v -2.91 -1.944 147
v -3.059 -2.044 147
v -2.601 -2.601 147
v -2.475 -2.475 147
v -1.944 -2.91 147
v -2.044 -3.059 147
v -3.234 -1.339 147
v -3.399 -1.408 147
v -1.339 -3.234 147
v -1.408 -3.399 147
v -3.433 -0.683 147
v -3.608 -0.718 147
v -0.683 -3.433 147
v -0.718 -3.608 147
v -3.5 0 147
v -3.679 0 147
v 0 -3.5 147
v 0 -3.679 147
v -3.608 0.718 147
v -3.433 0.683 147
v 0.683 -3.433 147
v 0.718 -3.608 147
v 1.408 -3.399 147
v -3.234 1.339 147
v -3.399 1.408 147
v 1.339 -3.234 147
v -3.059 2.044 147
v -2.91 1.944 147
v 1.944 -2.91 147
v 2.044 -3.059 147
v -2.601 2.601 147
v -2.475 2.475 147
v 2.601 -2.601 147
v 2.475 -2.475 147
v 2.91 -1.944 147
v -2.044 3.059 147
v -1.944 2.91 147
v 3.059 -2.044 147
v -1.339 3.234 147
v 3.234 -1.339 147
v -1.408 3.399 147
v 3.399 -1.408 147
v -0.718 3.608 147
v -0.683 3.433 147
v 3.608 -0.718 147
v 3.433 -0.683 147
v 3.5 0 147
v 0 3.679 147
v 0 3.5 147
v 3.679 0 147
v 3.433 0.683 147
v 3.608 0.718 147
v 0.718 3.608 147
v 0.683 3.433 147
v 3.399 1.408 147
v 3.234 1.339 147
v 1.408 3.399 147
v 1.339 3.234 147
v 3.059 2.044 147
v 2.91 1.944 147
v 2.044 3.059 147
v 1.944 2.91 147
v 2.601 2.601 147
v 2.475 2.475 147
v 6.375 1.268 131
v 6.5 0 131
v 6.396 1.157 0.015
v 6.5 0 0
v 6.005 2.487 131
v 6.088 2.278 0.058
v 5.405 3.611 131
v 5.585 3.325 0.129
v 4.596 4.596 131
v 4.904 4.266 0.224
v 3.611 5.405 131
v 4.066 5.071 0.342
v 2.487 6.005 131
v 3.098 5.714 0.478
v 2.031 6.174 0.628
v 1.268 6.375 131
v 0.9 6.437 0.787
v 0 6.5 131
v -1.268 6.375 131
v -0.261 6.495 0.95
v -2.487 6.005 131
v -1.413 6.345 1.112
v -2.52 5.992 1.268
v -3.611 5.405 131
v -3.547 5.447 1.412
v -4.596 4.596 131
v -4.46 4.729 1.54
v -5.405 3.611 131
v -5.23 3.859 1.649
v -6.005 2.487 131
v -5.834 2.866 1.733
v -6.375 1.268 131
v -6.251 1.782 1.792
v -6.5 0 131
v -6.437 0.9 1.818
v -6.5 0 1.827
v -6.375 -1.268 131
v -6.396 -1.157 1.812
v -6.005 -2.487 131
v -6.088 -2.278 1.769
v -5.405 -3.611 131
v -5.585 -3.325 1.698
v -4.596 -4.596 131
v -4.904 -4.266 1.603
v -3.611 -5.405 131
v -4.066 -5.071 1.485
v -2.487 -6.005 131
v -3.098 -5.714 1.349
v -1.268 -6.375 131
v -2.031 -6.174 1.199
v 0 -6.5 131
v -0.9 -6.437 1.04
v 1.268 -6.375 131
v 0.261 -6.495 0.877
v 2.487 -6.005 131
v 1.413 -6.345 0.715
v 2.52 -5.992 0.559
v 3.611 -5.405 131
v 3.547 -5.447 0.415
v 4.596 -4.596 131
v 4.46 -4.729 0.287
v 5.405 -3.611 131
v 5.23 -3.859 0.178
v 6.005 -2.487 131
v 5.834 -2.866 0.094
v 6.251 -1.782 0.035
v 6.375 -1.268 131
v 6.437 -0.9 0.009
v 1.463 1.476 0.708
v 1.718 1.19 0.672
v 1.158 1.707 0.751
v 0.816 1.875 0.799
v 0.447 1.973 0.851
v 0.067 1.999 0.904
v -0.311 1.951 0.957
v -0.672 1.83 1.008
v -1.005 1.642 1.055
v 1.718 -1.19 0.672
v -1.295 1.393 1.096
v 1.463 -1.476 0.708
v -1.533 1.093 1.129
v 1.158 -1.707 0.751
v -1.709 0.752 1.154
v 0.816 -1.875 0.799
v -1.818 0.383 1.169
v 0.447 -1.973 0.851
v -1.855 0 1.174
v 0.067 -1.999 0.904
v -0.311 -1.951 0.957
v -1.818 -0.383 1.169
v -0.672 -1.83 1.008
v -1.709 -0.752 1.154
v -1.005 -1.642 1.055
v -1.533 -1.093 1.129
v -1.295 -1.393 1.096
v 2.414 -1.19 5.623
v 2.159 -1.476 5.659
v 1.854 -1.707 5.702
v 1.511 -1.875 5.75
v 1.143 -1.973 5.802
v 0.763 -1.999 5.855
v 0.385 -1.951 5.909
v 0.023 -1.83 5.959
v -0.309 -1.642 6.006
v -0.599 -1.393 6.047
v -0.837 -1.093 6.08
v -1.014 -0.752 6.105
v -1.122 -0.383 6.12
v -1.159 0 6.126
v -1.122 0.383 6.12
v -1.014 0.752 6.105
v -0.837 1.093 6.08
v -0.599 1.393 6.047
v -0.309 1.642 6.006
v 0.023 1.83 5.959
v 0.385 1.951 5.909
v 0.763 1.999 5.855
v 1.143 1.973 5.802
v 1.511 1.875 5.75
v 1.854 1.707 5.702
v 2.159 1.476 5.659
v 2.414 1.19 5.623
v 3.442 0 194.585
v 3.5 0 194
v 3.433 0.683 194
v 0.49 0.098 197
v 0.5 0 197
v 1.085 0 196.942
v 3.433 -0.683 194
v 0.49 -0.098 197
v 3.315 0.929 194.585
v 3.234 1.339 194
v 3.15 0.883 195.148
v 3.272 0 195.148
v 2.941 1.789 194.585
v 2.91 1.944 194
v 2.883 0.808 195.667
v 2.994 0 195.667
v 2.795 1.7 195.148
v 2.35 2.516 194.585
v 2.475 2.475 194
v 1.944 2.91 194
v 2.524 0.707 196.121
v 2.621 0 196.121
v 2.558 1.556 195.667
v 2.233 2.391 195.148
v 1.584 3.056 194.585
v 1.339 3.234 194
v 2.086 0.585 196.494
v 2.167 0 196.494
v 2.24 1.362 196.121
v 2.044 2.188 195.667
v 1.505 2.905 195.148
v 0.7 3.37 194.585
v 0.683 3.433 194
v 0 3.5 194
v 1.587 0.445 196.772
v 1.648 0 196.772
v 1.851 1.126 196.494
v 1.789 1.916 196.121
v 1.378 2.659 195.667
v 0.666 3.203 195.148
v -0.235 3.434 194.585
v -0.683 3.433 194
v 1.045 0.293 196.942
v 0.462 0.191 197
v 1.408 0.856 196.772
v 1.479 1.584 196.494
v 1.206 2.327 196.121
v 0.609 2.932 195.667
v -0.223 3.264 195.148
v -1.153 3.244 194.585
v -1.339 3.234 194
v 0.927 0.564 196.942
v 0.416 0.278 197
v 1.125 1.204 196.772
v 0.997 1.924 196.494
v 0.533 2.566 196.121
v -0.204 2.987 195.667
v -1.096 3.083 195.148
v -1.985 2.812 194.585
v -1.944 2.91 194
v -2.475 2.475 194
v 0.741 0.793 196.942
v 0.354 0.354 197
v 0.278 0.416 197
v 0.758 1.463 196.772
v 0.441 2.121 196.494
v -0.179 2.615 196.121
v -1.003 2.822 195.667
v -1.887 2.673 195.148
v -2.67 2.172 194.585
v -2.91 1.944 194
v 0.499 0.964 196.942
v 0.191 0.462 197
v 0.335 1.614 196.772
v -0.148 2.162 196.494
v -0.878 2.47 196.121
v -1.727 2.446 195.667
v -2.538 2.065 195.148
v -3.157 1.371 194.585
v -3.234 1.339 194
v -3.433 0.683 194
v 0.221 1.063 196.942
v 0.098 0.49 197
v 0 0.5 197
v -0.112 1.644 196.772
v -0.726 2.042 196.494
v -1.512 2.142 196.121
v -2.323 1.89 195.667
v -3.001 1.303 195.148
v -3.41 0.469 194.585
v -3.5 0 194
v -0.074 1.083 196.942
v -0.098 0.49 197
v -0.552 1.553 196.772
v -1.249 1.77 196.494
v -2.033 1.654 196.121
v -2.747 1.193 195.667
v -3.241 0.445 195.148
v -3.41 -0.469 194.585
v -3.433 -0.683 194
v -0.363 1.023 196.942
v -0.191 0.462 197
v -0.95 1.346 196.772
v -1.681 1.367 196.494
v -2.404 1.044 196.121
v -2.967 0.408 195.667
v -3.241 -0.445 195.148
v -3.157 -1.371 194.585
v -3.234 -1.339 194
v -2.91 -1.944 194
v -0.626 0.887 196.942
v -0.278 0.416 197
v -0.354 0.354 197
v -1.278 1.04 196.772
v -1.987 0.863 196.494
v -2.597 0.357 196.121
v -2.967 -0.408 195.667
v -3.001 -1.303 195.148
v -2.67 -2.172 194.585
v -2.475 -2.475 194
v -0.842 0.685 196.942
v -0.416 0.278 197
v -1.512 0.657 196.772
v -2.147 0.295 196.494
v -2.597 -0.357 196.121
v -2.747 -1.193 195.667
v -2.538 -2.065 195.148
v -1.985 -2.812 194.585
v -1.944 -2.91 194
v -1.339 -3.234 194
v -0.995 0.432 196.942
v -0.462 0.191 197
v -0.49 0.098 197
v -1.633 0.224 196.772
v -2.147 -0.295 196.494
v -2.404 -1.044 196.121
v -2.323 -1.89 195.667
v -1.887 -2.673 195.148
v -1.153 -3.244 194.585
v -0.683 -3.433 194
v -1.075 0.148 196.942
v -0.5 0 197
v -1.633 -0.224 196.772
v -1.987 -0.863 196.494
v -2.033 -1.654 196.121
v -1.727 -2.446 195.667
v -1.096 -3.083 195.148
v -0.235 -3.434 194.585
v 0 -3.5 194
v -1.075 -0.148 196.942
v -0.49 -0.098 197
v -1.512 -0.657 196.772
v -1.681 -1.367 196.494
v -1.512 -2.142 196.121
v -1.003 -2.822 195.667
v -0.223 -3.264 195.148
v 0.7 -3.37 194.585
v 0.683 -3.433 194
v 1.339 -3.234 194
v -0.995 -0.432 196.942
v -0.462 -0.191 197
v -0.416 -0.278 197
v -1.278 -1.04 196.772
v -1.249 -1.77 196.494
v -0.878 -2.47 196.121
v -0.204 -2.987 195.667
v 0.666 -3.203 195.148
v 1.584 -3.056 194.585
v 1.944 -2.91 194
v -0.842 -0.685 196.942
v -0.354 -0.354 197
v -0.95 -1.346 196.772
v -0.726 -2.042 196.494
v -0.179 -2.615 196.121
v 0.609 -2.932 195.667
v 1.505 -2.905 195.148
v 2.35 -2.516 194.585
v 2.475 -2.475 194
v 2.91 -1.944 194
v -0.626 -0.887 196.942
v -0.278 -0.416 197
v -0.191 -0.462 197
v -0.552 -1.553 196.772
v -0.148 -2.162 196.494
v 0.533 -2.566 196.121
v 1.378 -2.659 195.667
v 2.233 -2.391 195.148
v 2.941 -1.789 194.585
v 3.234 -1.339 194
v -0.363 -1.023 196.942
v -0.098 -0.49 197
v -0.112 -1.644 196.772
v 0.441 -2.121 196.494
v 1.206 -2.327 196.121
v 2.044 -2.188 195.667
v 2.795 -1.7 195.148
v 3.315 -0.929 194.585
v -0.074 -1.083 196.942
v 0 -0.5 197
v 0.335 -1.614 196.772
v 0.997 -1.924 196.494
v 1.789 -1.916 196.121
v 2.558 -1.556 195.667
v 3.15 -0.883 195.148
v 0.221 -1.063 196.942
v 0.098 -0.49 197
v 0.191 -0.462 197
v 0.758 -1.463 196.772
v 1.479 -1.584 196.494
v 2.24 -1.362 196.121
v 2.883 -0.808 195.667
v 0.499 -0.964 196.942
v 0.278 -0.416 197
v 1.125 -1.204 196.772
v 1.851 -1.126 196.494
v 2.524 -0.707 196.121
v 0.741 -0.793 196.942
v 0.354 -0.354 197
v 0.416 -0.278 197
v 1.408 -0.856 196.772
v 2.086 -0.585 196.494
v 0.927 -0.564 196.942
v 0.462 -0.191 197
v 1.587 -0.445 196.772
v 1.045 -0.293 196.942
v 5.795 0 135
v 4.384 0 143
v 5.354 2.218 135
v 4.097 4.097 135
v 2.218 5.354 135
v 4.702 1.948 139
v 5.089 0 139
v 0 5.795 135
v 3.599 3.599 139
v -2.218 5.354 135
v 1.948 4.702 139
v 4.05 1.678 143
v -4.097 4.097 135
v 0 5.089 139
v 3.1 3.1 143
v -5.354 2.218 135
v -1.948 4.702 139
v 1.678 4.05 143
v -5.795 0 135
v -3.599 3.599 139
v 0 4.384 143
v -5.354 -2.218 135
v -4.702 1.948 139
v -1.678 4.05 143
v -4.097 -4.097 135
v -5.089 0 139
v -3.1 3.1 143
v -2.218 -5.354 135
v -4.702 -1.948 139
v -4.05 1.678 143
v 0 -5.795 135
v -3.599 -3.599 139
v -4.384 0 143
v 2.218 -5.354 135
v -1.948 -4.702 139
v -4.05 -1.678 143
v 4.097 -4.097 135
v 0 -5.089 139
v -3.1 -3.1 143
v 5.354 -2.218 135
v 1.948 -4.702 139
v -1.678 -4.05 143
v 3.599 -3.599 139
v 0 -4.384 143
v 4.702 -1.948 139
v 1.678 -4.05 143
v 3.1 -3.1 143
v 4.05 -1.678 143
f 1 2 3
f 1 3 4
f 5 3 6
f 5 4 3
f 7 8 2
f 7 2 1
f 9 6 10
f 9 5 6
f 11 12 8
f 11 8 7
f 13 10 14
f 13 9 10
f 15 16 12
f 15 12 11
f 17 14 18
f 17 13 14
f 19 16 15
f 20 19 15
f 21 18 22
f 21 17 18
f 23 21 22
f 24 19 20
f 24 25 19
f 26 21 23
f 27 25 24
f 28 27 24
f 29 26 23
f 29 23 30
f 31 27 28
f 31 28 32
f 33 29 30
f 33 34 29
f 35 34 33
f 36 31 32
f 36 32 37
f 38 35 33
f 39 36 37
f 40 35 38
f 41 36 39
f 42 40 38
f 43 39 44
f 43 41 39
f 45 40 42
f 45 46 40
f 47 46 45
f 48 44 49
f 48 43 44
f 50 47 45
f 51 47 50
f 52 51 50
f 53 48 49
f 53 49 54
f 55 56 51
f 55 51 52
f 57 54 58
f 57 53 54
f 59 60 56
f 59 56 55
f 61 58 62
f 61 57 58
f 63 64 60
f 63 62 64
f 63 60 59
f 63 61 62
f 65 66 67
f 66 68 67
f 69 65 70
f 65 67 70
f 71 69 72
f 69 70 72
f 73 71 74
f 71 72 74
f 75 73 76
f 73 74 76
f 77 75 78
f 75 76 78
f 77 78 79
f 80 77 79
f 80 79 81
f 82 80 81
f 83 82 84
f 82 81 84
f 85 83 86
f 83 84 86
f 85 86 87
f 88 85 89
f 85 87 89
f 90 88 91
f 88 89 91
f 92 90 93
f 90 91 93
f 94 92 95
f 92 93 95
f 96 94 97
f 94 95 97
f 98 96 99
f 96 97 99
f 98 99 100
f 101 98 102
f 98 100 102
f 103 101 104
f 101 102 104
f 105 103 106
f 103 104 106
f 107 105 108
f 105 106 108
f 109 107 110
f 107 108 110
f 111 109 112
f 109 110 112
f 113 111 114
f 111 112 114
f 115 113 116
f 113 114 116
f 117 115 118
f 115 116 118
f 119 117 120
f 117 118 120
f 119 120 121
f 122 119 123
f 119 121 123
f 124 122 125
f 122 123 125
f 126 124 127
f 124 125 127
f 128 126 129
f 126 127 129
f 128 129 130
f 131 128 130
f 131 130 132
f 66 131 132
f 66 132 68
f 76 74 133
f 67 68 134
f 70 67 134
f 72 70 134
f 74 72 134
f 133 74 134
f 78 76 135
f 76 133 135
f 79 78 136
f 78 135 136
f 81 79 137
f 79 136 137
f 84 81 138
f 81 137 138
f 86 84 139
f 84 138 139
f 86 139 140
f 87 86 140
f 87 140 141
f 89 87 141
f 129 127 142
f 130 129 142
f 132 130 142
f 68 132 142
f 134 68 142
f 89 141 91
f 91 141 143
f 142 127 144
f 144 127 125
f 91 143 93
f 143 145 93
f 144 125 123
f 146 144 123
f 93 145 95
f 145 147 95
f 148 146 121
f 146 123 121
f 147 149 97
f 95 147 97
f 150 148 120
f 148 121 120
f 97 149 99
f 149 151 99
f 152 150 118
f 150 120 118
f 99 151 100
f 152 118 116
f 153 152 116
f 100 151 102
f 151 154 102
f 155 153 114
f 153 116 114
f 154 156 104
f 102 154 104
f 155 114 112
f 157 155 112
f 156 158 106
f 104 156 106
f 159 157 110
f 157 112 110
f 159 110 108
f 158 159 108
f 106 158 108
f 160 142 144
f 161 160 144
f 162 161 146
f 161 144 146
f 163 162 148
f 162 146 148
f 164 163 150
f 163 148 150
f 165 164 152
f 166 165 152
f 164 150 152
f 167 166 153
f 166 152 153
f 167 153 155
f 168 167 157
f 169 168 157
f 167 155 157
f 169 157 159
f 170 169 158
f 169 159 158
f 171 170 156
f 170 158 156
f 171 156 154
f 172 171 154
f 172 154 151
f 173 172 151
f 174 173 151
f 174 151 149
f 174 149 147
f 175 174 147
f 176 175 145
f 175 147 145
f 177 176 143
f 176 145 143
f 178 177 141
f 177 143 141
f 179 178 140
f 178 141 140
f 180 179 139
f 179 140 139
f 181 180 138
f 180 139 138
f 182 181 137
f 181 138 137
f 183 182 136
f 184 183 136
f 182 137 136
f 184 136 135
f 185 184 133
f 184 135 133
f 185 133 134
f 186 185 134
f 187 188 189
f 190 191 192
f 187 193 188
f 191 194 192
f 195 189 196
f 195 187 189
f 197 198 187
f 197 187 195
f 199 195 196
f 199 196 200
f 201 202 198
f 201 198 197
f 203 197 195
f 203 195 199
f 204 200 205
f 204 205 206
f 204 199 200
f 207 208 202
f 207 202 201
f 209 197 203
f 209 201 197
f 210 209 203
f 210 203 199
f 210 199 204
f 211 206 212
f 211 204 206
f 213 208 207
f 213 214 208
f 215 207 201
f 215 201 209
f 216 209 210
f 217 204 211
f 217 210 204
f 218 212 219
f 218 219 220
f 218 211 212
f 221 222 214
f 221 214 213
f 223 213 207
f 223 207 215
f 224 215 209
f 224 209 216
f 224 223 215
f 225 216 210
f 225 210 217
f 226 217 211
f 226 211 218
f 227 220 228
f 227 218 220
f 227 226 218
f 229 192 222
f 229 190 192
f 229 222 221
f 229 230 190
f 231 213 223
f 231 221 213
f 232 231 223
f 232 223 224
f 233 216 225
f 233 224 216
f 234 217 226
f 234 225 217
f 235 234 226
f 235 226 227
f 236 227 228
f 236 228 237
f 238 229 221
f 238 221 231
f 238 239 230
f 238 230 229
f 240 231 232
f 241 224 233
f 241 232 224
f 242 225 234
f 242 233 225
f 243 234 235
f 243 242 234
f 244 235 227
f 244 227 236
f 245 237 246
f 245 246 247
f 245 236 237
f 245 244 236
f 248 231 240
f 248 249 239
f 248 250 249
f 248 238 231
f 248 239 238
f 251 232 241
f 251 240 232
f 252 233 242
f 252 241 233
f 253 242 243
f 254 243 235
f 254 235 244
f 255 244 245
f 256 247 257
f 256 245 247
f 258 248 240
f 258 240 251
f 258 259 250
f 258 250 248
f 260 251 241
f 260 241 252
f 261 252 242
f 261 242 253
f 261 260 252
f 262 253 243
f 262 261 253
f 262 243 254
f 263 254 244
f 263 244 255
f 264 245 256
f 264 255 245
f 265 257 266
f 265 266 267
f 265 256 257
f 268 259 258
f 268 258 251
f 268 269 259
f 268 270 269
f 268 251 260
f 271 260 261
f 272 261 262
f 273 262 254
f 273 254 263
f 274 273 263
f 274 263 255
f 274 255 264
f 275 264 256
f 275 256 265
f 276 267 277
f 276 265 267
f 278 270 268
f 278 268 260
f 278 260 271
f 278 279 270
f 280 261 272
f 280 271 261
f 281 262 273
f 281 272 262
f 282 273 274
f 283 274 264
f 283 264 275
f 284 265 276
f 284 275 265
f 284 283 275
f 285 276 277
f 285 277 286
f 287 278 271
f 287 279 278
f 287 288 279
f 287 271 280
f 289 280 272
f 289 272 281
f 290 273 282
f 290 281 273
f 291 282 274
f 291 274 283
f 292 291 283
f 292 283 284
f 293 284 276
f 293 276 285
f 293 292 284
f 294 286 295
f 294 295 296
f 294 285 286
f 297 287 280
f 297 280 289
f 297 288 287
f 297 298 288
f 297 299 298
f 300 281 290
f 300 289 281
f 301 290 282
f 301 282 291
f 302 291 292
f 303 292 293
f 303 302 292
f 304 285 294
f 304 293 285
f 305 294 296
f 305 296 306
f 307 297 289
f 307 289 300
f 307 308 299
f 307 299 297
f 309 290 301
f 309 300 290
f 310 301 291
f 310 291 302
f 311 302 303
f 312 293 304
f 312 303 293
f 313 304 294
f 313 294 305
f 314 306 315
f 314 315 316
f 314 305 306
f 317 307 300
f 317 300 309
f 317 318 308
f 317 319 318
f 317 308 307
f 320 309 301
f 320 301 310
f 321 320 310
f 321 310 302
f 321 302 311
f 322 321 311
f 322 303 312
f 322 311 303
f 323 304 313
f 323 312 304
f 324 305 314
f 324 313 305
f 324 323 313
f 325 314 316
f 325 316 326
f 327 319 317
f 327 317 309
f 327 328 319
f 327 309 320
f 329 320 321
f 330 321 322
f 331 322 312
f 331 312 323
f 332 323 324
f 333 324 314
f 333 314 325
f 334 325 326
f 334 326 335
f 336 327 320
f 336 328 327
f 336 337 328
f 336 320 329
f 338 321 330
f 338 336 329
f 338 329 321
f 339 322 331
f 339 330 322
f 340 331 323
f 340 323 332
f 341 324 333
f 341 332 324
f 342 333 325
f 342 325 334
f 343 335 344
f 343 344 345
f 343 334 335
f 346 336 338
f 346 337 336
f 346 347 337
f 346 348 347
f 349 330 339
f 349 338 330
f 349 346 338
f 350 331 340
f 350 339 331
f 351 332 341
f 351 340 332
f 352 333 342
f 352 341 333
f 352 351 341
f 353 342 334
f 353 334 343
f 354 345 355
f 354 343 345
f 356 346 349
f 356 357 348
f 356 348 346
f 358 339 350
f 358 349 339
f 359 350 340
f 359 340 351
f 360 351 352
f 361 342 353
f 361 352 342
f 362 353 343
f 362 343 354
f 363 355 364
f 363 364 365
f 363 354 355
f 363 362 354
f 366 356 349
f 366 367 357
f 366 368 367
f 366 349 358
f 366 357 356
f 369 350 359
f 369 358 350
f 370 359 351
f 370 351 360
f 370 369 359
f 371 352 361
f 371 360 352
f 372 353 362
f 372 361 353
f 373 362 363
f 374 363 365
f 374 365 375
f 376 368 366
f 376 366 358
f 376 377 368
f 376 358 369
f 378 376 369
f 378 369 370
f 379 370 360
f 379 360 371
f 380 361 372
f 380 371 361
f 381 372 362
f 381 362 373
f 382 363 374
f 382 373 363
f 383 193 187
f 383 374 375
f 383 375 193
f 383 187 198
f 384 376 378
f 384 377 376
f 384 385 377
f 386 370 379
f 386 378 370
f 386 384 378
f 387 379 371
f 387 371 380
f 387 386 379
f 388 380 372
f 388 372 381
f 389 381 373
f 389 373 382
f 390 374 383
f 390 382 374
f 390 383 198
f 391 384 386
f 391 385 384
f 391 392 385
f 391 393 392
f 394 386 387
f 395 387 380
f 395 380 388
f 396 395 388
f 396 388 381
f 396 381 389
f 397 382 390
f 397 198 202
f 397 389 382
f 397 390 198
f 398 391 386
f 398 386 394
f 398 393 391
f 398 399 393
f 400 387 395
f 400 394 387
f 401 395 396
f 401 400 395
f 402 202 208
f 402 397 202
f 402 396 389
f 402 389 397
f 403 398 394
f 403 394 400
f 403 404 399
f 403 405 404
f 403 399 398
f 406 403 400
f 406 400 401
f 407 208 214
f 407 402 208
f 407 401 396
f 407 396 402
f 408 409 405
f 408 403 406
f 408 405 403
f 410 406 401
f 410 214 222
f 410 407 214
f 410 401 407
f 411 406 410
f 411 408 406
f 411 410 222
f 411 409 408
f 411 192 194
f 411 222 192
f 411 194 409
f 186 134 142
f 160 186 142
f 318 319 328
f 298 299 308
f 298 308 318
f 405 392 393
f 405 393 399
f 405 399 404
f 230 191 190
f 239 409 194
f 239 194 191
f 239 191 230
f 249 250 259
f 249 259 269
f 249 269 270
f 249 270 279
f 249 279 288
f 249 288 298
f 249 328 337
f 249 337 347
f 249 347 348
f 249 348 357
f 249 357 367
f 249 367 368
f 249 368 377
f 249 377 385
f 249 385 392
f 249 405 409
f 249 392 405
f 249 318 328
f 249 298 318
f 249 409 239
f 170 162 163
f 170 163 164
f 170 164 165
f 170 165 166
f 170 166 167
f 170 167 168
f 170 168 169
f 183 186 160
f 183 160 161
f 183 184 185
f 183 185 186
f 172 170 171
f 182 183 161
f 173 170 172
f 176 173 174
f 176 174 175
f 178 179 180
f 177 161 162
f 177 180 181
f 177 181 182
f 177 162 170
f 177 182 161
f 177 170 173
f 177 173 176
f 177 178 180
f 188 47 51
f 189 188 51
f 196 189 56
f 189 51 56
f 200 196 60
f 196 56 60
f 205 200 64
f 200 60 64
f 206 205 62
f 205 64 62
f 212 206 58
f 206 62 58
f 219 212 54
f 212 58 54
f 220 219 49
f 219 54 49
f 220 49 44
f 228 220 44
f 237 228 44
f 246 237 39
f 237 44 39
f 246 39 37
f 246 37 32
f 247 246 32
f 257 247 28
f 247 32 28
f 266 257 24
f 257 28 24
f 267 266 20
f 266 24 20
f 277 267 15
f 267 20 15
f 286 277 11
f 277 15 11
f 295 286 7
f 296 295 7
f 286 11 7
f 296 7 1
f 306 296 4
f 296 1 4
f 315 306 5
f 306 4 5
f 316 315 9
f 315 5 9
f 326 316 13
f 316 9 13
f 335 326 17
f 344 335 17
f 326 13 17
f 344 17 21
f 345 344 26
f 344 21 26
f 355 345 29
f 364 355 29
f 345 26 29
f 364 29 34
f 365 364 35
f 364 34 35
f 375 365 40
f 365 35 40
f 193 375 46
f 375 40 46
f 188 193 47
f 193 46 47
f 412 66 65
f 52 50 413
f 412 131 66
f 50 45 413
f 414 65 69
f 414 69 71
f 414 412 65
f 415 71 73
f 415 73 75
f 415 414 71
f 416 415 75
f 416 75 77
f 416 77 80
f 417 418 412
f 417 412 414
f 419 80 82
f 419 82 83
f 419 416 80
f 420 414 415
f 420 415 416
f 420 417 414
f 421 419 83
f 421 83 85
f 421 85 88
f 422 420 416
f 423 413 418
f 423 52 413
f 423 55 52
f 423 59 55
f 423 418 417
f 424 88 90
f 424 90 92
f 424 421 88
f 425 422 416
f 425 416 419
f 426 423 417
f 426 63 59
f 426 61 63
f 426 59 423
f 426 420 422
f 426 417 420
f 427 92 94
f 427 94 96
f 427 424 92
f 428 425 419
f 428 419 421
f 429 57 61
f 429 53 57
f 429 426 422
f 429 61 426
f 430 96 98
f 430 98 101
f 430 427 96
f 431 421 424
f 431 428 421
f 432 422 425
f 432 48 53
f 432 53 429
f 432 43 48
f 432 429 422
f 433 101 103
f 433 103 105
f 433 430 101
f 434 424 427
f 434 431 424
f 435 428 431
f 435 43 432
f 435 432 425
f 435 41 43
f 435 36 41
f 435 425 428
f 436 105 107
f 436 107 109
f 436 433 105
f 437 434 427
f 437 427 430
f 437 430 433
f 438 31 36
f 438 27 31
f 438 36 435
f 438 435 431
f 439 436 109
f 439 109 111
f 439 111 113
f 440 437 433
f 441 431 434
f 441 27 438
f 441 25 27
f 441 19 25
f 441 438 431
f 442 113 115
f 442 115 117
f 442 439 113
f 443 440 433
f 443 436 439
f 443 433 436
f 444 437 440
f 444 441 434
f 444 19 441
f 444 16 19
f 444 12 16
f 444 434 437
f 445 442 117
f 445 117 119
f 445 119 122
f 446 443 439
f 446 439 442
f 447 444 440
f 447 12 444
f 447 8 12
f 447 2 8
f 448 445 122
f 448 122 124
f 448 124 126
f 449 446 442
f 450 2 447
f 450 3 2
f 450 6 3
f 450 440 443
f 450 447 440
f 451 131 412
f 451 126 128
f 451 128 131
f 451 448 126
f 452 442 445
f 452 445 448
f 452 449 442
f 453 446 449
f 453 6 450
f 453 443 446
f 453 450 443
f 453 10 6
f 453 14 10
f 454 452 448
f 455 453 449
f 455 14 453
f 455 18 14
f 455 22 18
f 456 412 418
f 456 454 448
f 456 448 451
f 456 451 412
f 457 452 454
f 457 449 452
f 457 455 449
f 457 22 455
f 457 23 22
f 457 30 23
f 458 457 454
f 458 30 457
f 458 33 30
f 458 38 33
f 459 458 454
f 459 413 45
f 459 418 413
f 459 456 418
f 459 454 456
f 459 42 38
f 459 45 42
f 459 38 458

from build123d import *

# Parameters (mm, degrees)
ESQUISSE1_R                  = 6.5
BOSS_EXTRU_1_DEPTH           = 147
ESQUISSE2_R                  = 3.5
BOSS_EXTRU_2_DEPTH           = 50
CONG_1_R                     = 3
CHANFREIN1_SIZE              = 16
CHANFREIN1_SIZE2             = 2.821231691
ENL_V_MAT_EXTRU_1_DEPTH      = 198.214350391
ENL_V_MAT_EXTRU_1_DEPTH_BACK = 198.214350391
ENL_V_MAT_EXTRU_2_DEPTH      = 5


with BuildPart() as part:
    # Esquisse1 → Boss.-Extru.1 (new body)
    with BuildSketch(Plane.XY):
        Circle(ESQUISSE1_R)
    extrude(amount=BOSS_EXTRU_1_DEPTH)

    # Esquisse2 → Boss.-Extru.2 (add)
    with BuildSketch(Plane.XY.offset(147)):
        Circle(ESQUISSE2_R)
    extrude(amount=BOSS_EXTRU_2_DEPTH)

    # Congé1
    cong_1_edges = [part.edges().sort_by_distance(p)[0] for p in [
        (-3.5, 0, 197),
    ]]
    fillet(cong_1_edges, radius=CONG_1_R)

    # Chanfrein1
    chanfrein1_edges = [part.edges().sort_by_distance(p)[0] for p in [
        (-6.5, 0, 147),
    ]]
    chanfrein1_side = [part.faces().sort_by_distance(p)[0] for p in [
        (-6.5, 0, 73.5),
    ]]
    chamfer(chanfrein1_edges, length=CHANFREIN1_SIZE, length2=CHANFREIN1_SIZE2, reference=chanfrein1_side[0])

    # Esquisse3 → Enlèv. mat.-Extru.1 (cut, two sides: drawn at the far end of the back side and taken through both)
    with BuildSketch(Plane(origin=(0, 0, 0), x_dir=(1, 0, 0), z_dir=(0, 1, 0)).offset(-ENL_V_MAT_EXTRU_1_DEPTH_BACK)):
        Polygon((6.5, 0), (-6.5, -1.827030851), (-6.5, 0), align=None)
    extrude(amount=ENL_V_MAT_EXTRU_1_DEPTH + ENL_V_MAT_EXTRU_1_DEPTH_BACK, mode=Mode.SUBTRACT)

    # Esquisse4 → Enlèv. mat.-Extru.2 (cut)
    with BuildSketch(Plane(origin=(0.125899488, 0, 0.895821406), x_dir=(-0.9902680687415714, 0, 0.1391731009600587), z_dir=(-0.1391731009600587, 0, -0.9902680687415714))):
        with BuildLine():
            Line((-1.607582844, 1.189822423), (-1.607582844, -1.189822423))
            ThreePointArc((-1.607582844, -1.189822423), (2, 0), (-1.607582844, 1.189822423))
        make_face()
    extrude(amount=-ENL_V_MAT_EXTRU_2_DEPTH, mode=Mode.SUBTRACT)


solid = part.part
